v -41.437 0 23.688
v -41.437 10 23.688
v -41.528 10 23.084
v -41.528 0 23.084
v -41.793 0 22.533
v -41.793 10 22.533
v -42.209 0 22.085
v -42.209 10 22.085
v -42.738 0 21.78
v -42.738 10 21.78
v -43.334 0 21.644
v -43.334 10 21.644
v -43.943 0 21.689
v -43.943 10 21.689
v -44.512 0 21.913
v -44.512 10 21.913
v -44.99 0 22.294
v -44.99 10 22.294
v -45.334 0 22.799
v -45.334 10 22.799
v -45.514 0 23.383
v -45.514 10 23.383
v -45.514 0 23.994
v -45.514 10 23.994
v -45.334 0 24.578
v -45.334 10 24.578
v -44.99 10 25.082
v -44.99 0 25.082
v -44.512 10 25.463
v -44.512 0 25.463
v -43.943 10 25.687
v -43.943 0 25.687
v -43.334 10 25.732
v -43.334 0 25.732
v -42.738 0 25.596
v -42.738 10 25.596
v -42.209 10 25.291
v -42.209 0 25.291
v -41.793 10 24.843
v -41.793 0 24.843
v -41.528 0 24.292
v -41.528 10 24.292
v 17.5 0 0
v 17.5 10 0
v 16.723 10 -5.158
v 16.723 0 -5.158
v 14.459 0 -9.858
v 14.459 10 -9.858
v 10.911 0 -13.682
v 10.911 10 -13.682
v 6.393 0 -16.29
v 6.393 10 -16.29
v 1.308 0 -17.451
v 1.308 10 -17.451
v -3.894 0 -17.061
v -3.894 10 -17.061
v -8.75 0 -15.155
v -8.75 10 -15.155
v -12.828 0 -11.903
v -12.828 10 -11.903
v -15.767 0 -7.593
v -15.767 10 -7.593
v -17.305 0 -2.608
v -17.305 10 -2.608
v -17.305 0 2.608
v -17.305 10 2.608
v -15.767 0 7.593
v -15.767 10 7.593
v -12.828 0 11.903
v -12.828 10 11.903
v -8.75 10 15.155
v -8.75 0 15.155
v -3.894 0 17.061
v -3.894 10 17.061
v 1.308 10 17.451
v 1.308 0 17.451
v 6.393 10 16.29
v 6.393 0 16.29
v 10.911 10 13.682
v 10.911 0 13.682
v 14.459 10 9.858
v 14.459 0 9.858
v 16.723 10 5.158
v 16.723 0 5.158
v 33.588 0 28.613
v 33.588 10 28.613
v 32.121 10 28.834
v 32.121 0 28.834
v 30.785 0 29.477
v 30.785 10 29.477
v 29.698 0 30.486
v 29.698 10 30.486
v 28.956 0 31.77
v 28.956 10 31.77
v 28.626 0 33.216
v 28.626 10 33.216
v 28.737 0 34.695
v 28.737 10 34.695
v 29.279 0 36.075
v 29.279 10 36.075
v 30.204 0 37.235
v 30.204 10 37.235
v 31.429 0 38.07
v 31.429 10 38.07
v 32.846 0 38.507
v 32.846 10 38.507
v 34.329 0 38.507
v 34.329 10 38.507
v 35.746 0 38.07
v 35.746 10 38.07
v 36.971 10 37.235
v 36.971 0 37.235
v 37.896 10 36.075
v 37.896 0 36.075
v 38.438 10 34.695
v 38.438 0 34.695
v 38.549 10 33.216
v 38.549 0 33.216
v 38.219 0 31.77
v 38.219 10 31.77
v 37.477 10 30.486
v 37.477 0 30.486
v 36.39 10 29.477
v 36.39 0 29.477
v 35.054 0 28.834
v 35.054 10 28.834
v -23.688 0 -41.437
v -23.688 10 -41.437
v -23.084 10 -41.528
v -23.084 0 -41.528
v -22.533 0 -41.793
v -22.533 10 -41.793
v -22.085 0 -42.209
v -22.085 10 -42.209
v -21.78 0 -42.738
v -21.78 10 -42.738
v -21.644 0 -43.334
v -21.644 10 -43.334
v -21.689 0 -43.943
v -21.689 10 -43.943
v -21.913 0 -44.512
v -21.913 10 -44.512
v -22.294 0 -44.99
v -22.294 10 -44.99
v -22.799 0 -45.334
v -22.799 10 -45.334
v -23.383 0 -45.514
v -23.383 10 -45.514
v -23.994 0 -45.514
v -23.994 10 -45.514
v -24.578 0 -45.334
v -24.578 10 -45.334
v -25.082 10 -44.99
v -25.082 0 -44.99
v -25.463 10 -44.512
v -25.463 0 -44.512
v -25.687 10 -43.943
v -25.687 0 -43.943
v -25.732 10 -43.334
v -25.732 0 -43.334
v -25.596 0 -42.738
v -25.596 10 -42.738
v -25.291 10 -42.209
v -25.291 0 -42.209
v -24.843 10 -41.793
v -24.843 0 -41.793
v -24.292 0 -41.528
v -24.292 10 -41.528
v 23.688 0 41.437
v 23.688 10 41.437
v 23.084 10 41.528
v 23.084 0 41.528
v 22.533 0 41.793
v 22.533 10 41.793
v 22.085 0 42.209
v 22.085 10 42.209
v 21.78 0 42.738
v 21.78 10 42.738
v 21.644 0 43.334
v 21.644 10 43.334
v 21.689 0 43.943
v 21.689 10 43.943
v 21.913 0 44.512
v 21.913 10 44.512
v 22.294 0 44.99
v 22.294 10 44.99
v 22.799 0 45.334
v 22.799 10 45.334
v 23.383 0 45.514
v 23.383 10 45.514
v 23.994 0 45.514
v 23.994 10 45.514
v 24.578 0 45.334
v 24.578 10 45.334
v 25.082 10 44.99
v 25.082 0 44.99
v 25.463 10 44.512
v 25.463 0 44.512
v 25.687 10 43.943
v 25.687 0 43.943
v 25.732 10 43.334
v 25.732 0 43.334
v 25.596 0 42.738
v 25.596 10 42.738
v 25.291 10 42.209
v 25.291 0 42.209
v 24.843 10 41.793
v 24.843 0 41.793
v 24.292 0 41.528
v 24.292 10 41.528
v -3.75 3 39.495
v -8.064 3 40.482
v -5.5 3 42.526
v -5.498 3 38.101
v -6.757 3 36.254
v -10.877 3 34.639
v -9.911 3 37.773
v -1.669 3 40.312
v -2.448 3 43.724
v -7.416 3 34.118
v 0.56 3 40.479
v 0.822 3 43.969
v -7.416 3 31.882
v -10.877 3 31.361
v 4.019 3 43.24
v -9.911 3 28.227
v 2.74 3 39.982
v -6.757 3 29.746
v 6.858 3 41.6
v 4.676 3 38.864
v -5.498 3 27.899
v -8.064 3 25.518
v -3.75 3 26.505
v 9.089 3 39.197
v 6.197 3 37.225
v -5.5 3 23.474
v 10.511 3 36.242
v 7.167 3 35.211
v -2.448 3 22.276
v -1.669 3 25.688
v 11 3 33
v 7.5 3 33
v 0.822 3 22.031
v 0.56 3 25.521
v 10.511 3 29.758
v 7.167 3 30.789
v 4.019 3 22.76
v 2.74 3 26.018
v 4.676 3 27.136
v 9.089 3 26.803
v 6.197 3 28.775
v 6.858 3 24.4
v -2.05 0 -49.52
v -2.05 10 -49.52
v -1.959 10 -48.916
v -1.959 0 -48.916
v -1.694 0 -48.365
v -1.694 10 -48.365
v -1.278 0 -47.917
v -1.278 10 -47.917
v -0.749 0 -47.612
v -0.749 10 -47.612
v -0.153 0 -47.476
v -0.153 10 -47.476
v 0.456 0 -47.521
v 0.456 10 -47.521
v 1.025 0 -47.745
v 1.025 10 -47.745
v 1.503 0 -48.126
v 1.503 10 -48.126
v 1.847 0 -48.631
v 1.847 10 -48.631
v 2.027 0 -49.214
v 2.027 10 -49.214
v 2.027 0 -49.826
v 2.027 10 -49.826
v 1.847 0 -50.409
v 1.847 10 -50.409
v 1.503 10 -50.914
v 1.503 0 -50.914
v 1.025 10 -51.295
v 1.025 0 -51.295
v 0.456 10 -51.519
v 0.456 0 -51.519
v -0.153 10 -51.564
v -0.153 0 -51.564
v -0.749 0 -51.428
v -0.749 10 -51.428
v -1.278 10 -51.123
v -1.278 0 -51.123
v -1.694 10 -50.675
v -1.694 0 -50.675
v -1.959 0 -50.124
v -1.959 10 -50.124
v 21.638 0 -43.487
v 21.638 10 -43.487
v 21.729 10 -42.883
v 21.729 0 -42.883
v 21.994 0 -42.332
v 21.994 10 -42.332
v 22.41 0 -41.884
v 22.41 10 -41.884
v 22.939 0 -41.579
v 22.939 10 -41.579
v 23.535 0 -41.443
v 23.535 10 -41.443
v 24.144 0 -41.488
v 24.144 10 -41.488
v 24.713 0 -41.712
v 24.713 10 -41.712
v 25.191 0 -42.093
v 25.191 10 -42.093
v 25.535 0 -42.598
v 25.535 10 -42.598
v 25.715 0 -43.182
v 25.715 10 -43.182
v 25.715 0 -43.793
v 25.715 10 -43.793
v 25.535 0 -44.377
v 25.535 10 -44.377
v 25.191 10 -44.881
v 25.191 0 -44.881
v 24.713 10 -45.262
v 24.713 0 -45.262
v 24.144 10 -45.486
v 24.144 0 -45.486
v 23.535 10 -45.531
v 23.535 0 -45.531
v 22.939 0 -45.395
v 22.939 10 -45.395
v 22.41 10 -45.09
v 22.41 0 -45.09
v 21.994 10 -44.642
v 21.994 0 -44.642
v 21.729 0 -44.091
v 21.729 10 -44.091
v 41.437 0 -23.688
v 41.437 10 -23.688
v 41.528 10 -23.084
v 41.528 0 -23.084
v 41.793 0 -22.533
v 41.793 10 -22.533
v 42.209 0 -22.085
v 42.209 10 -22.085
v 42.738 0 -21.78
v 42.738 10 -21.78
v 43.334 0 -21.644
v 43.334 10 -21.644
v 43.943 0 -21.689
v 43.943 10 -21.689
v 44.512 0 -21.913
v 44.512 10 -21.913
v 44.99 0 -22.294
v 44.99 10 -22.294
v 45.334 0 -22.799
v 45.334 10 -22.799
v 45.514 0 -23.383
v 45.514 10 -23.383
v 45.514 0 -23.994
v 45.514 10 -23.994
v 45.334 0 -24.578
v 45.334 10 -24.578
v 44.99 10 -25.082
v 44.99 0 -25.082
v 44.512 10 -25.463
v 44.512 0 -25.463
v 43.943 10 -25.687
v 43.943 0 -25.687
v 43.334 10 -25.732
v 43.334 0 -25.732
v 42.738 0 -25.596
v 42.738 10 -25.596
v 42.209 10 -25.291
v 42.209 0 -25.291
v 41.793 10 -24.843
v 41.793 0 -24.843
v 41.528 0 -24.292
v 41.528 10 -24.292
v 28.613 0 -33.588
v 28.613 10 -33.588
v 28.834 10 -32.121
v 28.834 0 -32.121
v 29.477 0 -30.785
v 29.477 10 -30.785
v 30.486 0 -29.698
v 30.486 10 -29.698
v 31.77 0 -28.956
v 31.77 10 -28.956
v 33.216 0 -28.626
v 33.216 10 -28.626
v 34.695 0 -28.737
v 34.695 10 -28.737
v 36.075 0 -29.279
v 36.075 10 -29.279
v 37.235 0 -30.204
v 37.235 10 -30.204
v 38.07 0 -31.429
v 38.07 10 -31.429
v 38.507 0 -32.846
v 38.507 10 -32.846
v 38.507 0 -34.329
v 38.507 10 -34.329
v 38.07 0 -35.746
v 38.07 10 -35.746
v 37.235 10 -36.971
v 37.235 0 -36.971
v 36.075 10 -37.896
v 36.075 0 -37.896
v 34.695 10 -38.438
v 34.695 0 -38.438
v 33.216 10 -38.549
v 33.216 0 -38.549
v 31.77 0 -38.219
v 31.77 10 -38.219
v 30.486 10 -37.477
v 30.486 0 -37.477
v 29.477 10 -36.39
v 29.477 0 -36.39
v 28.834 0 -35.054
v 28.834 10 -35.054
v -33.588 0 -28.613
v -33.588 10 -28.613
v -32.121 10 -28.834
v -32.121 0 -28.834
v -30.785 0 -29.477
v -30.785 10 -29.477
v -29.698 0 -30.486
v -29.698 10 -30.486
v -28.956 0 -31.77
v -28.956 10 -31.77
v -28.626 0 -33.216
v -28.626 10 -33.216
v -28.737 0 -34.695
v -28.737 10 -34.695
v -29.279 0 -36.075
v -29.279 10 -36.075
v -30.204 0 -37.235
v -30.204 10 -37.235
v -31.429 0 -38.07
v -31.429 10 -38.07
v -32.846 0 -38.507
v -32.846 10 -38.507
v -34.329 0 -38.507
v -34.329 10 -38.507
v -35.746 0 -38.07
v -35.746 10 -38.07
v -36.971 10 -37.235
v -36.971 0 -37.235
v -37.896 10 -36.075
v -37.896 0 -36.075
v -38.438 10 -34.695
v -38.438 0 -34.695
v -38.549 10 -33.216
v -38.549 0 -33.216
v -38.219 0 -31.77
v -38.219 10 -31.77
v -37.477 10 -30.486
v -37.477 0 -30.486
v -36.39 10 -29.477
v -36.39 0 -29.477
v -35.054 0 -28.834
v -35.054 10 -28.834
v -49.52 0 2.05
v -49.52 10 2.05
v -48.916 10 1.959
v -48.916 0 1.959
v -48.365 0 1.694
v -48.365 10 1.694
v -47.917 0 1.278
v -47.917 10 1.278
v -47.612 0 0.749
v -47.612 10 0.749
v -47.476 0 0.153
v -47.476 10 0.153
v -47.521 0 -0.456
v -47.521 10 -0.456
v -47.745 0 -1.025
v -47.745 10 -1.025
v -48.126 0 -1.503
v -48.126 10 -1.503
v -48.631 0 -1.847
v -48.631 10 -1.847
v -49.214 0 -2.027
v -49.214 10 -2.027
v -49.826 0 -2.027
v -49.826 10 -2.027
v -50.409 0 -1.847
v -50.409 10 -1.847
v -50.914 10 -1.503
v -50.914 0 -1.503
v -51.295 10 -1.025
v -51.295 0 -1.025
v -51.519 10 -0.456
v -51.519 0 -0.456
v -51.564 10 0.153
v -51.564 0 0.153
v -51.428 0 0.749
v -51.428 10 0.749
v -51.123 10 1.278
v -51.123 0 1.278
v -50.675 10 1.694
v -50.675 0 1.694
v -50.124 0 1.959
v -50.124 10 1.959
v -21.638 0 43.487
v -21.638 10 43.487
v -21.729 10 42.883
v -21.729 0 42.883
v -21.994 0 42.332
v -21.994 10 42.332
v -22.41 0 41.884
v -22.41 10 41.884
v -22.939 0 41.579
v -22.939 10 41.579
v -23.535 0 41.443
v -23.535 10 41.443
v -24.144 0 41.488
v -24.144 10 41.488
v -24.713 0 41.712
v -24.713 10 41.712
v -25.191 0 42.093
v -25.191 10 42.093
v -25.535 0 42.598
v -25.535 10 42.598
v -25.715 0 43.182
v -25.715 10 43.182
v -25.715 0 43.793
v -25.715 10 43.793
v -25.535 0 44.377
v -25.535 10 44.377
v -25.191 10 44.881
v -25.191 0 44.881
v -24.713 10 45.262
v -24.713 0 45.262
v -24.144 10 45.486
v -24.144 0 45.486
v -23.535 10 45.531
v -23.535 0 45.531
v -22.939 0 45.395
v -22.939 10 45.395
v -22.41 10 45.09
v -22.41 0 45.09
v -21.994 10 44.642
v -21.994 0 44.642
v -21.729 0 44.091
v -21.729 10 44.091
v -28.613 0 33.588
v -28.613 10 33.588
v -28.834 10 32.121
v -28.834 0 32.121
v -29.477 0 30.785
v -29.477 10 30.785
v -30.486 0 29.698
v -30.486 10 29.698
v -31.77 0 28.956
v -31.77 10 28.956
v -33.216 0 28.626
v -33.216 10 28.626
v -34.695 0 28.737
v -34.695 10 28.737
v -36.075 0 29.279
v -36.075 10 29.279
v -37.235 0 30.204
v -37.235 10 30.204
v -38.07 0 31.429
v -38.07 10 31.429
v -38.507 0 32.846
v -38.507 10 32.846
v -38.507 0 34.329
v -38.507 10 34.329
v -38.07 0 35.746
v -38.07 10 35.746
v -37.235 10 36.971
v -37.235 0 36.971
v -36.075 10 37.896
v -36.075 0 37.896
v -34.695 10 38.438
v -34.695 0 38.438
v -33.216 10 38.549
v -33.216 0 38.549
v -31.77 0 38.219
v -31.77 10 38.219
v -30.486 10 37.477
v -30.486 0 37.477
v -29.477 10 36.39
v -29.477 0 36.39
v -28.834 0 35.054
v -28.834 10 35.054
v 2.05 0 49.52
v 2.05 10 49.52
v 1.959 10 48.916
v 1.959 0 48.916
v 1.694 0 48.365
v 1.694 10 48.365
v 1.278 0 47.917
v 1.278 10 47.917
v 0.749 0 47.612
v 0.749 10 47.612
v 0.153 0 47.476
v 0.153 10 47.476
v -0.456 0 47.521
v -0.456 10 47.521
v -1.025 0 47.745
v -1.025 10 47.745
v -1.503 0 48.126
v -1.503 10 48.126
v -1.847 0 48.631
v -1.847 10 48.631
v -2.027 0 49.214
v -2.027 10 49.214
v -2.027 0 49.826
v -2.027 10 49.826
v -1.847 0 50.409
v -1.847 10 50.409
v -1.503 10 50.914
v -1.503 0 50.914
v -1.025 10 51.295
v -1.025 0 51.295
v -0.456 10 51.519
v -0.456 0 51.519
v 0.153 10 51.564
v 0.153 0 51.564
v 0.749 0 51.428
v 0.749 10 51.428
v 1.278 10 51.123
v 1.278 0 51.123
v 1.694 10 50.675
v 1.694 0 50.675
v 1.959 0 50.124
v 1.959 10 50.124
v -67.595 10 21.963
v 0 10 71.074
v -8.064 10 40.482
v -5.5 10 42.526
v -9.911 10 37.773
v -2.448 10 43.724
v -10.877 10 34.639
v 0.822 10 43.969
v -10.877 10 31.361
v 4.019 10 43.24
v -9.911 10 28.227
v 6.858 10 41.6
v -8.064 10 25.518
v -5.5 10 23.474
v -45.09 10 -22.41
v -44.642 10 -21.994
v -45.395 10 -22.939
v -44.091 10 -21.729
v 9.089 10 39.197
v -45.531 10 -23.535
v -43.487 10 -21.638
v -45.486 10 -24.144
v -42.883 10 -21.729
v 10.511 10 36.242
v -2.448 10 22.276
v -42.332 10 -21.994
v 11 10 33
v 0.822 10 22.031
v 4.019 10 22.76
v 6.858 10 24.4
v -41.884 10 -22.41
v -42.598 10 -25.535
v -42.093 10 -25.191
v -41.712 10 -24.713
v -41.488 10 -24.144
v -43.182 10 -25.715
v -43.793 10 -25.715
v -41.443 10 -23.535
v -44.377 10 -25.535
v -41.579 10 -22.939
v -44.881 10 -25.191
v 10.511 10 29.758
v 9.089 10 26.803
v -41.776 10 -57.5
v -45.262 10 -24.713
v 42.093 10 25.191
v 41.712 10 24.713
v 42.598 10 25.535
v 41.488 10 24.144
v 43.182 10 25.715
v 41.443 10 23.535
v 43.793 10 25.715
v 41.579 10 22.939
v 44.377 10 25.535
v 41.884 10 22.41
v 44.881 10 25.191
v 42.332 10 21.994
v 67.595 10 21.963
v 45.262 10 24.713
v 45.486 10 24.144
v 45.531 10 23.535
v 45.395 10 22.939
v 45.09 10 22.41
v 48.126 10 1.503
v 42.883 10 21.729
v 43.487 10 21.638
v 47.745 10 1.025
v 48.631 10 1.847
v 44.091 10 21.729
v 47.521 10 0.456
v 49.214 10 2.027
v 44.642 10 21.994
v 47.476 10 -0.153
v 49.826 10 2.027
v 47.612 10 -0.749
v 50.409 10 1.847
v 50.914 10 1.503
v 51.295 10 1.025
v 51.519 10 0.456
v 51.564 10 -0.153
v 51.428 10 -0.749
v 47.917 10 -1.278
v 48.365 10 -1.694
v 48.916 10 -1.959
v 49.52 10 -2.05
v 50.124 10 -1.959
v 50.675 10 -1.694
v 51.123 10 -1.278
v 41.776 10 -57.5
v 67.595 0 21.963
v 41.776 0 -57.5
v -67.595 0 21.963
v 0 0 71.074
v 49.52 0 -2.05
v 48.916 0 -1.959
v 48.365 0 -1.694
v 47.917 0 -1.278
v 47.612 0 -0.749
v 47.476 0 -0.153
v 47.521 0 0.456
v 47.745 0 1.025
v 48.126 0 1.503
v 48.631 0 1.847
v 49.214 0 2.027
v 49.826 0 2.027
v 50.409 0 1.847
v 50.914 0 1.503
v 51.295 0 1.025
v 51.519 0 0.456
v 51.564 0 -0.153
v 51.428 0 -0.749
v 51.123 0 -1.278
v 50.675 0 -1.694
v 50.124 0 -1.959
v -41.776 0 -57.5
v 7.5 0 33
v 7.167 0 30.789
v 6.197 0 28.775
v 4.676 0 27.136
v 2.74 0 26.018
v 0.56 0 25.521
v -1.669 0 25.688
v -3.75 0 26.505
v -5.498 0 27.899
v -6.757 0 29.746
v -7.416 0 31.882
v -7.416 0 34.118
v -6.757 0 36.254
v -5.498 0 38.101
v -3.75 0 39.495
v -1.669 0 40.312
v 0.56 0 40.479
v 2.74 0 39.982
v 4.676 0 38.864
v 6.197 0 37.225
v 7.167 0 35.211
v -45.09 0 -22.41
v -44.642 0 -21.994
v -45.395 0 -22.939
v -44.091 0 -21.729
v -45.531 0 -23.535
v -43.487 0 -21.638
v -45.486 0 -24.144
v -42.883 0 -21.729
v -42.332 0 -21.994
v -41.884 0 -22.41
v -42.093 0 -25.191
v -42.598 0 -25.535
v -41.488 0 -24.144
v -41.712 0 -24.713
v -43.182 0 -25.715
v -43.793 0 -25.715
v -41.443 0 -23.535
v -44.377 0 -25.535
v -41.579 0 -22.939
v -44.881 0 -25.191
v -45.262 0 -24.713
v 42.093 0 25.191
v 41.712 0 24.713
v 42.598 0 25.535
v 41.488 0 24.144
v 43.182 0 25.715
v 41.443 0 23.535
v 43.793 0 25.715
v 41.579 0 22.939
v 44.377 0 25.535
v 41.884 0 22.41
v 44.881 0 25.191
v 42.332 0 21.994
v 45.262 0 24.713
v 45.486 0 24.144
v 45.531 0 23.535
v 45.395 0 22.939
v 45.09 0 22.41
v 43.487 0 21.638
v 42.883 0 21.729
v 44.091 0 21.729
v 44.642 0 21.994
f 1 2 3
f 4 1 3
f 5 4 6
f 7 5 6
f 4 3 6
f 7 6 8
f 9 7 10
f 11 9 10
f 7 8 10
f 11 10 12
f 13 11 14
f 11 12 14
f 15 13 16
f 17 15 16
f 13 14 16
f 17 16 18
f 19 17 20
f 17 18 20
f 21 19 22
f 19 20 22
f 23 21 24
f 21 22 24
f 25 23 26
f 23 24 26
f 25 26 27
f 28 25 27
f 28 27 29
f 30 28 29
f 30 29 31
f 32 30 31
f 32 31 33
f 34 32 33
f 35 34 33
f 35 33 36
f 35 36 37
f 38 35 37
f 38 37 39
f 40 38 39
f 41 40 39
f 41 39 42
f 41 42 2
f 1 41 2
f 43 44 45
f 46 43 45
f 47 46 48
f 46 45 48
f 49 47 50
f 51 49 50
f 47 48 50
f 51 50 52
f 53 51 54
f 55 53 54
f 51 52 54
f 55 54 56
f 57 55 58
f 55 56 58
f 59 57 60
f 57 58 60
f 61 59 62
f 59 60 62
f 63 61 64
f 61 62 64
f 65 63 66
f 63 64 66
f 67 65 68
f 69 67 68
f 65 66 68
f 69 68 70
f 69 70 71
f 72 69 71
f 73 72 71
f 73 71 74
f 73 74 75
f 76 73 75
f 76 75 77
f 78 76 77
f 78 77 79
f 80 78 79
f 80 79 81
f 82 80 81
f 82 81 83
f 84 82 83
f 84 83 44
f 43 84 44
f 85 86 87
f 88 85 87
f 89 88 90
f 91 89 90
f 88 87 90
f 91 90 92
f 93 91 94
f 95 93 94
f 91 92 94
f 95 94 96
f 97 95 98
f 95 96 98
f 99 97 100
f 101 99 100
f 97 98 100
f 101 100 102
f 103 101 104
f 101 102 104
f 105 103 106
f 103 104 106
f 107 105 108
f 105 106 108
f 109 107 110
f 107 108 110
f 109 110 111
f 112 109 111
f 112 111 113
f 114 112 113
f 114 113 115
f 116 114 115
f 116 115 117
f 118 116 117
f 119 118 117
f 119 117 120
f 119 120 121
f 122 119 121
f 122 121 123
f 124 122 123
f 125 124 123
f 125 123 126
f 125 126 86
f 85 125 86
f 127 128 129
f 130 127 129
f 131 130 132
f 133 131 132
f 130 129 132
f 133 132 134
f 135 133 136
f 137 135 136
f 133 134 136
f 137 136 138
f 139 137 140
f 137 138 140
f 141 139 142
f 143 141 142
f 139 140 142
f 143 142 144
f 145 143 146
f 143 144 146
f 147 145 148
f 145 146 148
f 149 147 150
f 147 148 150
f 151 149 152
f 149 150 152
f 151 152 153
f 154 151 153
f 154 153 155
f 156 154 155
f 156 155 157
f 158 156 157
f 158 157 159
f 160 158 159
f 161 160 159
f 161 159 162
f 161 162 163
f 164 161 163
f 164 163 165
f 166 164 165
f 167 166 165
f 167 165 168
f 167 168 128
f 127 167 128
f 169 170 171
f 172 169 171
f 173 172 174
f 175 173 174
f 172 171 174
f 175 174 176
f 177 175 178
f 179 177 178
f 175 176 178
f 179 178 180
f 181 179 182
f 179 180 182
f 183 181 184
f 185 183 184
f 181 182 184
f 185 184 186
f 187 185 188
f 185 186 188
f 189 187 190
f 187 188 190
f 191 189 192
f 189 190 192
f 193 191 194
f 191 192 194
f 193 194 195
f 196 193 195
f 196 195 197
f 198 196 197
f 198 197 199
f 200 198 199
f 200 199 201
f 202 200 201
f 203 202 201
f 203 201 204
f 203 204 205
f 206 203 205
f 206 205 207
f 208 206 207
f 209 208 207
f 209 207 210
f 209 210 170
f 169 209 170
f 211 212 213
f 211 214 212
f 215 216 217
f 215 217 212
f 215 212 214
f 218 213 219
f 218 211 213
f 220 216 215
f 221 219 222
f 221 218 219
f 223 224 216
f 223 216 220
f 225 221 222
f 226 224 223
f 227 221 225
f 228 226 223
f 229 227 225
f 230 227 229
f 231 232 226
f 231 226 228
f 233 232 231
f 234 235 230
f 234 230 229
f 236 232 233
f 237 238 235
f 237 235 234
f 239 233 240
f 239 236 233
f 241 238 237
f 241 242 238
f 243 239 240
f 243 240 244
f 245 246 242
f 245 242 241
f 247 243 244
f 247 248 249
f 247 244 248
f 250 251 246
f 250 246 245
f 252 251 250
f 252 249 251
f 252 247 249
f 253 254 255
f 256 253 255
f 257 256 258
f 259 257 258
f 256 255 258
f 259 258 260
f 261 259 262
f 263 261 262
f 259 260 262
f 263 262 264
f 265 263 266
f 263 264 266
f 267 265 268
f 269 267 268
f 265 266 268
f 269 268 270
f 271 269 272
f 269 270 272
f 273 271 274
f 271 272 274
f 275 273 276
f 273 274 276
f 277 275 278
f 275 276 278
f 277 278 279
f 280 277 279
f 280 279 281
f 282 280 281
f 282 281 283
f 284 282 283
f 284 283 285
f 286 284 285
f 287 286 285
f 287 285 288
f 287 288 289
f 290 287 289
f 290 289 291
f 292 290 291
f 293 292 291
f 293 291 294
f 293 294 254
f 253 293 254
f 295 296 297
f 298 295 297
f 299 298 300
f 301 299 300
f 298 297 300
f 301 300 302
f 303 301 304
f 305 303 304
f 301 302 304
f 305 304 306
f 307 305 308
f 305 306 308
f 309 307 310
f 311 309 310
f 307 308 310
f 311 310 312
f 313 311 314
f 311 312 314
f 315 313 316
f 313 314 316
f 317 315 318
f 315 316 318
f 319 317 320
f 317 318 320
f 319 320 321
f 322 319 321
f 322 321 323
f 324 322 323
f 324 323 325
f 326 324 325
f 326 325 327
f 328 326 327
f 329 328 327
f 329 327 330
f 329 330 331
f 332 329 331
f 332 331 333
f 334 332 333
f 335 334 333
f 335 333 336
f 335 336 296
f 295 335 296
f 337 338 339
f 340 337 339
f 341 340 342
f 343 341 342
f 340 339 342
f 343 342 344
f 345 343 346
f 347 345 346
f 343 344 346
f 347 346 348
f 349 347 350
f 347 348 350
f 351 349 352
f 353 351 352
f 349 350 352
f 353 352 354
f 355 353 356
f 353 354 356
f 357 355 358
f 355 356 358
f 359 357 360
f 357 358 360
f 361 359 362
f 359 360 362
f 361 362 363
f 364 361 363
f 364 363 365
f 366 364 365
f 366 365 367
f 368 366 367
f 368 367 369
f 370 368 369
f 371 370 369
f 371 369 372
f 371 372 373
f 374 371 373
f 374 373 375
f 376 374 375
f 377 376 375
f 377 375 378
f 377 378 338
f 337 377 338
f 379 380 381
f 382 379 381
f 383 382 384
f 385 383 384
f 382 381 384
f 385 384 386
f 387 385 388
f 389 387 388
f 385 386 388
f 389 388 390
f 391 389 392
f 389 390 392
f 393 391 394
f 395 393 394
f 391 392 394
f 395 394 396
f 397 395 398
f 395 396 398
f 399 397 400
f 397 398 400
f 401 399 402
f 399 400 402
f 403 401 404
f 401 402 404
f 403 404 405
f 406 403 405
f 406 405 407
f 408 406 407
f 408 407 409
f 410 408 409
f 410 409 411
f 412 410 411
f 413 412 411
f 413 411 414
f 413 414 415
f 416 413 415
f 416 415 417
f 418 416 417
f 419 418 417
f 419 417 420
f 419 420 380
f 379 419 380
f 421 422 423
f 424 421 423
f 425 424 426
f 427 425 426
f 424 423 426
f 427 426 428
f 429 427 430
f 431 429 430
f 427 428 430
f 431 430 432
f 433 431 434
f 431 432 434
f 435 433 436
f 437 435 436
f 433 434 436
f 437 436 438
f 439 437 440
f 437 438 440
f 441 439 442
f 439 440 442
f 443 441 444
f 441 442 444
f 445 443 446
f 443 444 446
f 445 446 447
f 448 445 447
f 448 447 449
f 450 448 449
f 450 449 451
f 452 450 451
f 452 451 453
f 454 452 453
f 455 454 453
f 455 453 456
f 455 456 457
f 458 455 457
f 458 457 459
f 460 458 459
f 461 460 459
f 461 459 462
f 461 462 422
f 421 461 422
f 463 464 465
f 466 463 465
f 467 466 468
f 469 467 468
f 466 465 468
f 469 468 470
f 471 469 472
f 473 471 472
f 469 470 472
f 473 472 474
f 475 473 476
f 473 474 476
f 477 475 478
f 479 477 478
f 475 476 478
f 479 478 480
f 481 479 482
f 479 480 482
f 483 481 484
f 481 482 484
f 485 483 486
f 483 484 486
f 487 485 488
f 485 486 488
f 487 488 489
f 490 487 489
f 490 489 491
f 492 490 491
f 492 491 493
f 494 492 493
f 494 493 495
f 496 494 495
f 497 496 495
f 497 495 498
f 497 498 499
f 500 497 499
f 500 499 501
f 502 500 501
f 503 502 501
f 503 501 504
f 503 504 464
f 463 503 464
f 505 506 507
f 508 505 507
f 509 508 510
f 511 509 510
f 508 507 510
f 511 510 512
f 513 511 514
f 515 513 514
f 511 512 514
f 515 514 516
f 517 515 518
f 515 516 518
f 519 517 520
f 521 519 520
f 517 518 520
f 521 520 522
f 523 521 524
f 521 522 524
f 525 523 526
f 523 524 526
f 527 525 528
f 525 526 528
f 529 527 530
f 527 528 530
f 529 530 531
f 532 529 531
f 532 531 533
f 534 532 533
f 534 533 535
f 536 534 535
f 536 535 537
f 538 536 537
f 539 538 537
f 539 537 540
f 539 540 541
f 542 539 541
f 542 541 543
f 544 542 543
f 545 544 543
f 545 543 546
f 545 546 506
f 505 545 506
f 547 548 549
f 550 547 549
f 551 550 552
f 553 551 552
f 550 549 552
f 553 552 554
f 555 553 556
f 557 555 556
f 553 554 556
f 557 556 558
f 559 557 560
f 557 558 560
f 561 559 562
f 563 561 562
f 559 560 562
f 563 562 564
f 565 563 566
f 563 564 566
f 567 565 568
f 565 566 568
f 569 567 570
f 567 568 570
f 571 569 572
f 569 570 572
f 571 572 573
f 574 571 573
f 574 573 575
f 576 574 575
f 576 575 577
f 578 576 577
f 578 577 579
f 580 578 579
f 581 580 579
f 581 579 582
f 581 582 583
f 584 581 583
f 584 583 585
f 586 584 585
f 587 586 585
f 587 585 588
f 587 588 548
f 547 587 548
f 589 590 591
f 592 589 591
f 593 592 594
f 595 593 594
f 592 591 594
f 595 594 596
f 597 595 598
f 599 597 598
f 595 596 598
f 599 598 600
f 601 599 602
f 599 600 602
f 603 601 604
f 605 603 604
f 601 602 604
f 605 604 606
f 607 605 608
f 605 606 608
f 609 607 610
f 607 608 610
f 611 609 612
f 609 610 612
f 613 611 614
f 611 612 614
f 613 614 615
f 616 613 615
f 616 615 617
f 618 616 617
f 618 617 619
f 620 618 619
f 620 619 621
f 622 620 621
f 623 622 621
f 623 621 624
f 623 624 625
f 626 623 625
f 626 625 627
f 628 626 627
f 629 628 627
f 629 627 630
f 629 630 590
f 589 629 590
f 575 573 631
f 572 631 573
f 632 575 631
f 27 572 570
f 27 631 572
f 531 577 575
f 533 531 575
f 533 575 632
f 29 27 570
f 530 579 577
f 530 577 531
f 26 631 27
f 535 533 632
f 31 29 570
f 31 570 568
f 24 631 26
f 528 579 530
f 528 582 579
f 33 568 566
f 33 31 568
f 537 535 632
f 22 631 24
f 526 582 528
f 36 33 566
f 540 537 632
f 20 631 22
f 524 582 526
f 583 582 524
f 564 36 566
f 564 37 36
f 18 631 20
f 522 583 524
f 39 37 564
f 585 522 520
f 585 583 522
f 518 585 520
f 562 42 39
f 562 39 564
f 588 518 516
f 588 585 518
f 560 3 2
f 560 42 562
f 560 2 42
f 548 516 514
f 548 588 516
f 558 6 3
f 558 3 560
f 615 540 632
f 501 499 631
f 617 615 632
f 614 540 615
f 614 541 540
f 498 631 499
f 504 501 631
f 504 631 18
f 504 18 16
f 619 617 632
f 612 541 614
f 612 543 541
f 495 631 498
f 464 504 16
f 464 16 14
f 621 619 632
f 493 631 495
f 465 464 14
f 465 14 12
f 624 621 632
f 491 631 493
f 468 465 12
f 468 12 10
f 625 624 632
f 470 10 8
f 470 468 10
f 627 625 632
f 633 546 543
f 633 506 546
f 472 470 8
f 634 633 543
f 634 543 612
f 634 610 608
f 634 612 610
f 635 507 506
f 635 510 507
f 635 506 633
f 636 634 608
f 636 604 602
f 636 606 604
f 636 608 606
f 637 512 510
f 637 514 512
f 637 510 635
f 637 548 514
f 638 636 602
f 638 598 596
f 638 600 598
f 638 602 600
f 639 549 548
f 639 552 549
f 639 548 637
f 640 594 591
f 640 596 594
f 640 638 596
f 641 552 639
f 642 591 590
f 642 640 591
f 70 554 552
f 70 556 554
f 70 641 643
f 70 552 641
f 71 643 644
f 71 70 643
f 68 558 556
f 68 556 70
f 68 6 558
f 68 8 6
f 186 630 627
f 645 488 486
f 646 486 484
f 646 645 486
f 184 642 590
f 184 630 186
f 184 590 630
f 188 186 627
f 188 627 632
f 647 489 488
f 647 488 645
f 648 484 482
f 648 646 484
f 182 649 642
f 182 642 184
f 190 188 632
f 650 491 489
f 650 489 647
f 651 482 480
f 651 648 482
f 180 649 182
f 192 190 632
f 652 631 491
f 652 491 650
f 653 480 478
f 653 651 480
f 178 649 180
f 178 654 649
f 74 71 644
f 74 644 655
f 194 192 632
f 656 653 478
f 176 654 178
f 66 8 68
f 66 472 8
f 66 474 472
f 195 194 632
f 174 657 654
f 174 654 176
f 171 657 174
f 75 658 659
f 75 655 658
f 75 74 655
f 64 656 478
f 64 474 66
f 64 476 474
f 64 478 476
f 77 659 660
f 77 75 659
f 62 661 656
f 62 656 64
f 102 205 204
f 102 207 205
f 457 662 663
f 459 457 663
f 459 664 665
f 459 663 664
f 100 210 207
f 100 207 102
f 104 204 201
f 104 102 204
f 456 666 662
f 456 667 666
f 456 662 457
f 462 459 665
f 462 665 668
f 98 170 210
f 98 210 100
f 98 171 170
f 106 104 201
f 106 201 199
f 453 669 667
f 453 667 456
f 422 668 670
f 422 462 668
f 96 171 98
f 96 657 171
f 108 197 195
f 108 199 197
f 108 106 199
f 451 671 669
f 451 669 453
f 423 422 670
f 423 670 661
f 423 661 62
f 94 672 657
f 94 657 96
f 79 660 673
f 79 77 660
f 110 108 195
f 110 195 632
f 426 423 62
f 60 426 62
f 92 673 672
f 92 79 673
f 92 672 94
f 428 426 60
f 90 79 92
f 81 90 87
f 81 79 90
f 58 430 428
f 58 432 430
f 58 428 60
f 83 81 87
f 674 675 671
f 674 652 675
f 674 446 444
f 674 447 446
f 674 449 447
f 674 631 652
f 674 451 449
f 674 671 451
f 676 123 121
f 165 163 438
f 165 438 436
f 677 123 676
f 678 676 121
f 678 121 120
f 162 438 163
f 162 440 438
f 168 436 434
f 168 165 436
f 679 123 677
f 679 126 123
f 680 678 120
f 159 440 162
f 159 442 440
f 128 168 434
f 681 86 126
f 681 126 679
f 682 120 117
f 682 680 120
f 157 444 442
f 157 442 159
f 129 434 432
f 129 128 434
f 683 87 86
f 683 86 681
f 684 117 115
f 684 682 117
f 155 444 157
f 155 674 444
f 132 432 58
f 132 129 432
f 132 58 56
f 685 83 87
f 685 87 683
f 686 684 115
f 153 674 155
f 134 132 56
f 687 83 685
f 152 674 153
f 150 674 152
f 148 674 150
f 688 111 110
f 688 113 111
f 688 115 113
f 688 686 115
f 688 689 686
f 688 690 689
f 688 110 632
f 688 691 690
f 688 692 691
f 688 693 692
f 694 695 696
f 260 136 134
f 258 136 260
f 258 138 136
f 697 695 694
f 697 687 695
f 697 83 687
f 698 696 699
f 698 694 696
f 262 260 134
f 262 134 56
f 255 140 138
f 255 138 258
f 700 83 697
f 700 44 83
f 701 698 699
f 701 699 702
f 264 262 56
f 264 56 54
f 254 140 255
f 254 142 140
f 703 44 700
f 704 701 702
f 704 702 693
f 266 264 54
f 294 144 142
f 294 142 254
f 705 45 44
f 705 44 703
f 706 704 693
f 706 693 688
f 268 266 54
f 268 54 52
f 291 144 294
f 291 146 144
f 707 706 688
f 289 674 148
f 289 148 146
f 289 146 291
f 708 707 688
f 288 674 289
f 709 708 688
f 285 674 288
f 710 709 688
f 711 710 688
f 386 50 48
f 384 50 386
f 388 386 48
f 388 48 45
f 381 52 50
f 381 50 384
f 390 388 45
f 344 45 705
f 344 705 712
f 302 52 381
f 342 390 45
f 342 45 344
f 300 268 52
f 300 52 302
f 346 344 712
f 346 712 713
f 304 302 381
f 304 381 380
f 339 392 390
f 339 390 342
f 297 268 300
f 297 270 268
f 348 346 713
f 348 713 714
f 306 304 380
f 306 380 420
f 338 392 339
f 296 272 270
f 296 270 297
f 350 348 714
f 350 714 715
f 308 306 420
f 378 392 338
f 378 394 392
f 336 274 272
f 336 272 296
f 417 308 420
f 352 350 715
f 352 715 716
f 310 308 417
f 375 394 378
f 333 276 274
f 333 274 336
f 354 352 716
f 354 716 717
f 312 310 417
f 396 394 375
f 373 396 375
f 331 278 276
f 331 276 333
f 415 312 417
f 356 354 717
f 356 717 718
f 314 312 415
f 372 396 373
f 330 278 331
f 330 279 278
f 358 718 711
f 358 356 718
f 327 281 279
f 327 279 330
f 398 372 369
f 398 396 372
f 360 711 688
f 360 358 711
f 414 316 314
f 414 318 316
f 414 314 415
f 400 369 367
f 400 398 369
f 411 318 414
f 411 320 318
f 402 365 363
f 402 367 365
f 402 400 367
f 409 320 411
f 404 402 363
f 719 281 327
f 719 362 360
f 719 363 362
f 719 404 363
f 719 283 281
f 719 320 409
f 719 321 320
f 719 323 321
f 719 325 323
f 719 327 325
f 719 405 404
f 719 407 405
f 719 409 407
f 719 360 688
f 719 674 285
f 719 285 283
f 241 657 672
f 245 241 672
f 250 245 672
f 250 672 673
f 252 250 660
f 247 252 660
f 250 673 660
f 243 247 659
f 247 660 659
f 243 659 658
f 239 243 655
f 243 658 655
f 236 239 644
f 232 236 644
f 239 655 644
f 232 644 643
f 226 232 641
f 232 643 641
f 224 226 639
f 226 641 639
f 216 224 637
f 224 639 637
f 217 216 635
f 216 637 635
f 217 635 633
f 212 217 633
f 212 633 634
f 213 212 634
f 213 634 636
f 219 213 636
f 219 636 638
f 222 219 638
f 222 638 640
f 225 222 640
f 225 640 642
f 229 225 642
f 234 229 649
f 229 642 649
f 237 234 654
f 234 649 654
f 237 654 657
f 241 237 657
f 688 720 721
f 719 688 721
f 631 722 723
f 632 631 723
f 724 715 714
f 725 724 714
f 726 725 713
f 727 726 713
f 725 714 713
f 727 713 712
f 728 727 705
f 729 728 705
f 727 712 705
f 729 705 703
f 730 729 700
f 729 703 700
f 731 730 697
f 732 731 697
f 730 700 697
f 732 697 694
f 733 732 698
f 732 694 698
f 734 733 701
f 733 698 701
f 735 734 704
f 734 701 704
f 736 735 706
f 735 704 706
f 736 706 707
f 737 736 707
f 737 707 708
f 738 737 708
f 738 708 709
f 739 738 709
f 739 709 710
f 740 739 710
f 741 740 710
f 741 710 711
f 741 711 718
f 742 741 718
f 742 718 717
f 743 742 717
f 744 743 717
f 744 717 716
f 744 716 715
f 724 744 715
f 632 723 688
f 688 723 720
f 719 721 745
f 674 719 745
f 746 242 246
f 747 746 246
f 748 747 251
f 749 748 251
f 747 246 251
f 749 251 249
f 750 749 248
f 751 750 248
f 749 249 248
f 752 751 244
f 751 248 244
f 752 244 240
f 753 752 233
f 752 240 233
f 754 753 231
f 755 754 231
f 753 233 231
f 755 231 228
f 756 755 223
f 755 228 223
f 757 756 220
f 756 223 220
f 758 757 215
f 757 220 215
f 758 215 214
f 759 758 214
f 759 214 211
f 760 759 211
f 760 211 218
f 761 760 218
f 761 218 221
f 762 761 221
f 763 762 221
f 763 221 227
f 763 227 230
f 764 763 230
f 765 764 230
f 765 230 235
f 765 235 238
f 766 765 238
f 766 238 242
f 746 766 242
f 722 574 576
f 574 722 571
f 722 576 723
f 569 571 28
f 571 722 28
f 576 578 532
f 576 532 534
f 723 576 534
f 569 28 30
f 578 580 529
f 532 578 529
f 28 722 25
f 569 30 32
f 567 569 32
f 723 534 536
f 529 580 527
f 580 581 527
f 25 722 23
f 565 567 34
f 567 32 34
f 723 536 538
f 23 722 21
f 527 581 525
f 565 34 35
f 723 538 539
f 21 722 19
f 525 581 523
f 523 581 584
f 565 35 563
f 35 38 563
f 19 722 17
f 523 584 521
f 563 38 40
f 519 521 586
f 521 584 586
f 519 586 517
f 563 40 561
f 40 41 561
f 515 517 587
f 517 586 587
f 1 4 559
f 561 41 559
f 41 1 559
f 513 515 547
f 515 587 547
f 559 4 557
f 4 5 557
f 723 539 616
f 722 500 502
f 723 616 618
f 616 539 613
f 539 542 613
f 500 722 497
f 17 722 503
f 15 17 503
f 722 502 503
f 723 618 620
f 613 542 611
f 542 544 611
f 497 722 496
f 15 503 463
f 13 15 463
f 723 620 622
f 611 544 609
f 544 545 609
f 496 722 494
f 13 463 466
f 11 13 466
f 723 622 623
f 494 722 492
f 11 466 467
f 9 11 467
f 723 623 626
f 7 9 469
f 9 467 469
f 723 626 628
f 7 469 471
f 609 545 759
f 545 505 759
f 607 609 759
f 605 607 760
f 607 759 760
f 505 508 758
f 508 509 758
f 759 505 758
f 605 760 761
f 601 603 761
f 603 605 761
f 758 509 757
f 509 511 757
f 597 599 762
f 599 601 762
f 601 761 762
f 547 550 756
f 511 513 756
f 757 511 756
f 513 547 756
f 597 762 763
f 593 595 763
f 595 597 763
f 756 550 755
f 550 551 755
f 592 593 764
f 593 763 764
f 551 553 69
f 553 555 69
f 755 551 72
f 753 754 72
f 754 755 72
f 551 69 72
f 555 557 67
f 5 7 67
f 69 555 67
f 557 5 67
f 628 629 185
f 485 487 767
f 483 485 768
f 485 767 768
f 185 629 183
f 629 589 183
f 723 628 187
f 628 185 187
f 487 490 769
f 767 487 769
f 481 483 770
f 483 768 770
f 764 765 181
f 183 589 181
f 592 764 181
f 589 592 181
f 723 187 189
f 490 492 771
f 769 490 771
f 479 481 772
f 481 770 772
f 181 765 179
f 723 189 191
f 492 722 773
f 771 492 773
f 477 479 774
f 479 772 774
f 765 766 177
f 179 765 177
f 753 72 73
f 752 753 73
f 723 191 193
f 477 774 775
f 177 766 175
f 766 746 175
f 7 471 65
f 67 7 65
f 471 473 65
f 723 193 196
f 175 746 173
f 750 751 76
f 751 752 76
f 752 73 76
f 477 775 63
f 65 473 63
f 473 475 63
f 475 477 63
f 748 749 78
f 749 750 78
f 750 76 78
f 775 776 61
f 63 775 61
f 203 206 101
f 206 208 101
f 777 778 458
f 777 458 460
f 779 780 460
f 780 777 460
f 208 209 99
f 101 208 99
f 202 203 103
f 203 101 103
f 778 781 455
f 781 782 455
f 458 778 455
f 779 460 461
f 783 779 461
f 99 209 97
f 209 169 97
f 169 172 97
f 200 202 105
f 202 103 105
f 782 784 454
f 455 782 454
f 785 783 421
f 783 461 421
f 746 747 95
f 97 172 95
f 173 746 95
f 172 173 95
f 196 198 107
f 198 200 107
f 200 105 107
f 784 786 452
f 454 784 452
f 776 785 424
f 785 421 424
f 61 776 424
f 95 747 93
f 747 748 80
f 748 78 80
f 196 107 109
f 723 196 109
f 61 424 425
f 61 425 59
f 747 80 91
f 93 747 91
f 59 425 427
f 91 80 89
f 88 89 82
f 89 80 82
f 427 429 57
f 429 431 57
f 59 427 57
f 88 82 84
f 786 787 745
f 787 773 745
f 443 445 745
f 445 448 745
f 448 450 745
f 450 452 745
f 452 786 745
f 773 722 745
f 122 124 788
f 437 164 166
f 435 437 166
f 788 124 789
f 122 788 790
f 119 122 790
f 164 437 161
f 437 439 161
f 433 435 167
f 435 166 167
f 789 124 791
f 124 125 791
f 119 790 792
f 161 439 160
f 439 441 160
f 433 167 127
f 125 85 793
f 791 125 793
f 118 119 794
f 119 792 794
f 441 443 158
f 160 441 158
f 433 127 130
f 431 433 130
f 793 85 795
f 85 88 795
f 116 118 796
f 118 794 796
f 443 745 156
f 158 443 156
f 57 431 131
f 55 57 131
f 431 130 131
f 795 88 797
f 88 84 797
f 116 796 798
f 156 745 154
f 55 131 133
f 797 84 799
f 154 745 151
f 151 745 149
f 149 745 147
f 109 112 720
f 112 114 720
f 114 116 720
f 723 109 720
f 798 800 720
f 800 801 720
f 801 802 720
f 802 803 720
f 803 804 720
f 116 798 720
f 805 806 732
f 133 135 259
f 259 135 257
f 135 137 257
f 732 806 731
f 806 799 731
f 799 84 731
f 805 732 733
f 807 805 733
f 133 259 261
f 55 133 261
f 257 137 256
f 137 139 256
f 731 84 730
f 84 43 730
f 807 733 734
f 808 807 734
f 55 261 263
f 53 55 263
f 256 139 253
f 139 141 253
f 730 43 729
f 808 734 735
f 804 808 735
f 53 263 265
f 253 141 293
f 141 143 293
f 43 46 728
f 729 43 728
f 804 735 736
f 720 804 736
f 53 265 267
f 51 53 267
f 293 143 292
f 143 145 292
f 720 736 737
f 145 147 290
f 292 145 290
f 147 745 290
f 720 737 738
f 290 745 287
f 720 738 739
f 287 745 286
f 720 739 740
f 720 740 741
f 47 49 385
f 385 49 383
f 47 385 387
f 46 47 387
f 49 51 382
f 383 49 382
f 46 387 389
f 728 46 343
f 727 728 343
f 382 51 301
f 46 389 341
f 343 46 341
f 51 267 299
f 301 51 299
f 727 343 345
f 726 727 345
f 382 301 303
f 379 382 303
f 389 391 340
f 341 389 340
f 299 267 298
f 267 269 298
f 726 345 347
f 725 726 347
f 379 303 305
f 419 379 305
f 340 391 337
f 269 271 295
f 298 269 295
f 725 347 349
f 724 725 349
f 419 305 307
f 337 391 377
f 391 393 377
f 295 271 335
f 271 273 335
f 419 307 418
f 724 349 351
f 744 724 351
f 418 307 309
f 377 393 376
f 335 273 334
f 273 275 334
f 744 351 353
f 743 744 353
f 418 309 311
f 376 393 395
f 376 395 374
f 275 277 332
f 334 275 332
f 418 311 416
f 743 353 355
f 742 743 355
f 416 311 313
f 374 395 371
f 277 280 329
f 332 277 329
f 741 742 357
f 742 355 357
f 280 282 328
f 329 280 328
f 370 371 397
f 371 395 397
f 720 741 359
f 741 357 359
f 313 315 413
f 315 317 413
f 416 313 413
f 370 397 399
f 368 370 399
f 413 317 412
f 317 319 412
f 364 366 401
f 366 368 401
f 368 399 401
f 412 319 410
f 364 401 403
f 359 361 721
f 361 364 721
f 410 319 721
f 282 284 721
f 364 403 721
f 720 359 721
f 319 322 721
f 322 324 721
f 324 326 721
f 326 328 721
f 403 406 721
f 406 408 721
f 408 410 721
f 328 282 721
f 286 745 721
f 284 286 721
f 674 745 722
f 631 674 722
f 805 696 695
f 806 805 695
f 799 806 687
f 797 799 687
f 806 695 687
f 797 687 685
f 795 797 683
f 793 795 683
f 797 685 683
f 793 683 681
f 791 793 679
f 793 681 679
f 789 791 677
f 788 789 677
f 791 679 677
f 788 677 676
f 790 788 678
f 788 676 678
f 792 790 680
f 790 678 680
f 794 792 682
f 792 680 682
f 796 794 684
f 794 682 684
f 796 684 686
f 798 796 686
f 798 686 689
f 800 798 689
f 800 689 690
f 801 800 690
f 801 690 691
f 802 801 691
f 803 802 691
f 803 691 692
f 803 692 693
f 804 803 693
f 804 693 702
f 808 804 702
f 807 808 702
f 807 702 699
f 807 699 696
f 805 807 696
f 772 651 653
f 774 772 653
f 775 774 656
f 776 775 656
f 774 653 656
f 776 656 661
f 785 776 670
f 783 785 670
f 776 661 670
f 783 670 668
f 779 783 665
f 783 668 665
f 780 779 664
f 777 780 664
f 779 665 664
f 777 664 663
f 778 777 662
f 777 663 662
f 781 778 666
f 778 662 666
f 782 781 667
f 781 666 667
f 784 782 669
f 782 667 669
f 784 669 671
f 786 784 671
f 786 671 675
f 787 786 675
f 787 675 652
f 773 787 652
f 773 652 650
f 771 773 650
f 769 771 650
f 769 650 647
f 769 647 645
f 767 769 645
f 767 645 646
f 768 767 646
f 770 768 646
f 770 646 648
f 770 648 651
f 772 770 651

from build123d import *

# Parameters (mm, degrees)
BOSS_EXTRUDE1_DEPTH = 10
SKETCH2_R           = 11
CUT_EXTRUDE1_DEPTH  = 7
SKETCH3_R           = 7.5
CUT_EXTRUDE2_DEPTH  = 4
SKETCH5_R           = 4.975
SKETCH5_R_2         = 2.05
CUT_EXTRUDE4_DEPTH  = 11
SKETCH6_R           = 2.05
CUT_EXTRUDE5_DEPTH  = 11
CIRPATTERN1_COUNT   = 4
SKETCH7_R           = 17.5
CUT_EXTRUDE6_DEPTH  = 11


with BuildPart() as part:
    # Sketch1 → Boss-Extrude1 (new body)
    with BuildSketch(Plane(origin=(0, 0, 0), x_dir=(1, 0, 0), z_dir=(0, 1, 0))):
        Polygon((0, -71.073908706), (67.595304014, -21.963045647), (41.77619536, 57.5), (-41.77619536, 57.5), (-67.595304014, -21.963045647), align=None)
    extrude(amount=BOSS_EXTRUDE1_DEPTH)

    # Sketch2 → Cut-Extrude1 (cut)
    with BuildSketch(Plane(origin=(0, 10, 0), x_dir=(1, 0, 0), z_dir=(0, 1, 0))):
        with Locations((0, -33)):
            Circle(SKETCH2_R)
    extrude(amount=-CUT_EXTRUDE1_DEPTH, mode=Mode.SUBTRACT)

    # Sketch3 → Cut-Extrude2 (cut, through all)
    with BuildSketch(Plane(origin=(0, 3, 0), x_dir=(1, 0, 0), z_dir=(0, 1, 0))):
        with Locations((0, -33)):
            Circle(SKETCH3_R)
    extrude(amount=-CUT_EXTRUDE2_DEPTH, mode=Mode.SUBTRACT)

    # Sketch5 → Cut-Extrude4 (cut, through all)
    with BuildSketch(Plane(origin=(0, 10, 0), x_dir=(1, 0, 0), z_dir=(0, 1, 0))):
        with Locations((-33.587572106, -33.587572106)):
            Circle(SKETCH5_R)
        with Locations((-43.487067043, -23.68807717)):
            Circle(SKETCH5_R_2)
        with Locations((-23.68807717, -43.487067043)):
            Circle(SKETCH5_R_2)
    cut_extrude4 = extrude(amount=-CUT_EXTRUDE4_DEPTH, mode=Mode.SUBTRACT)

    # Sketch6 → Cut-Extrude5 (cut, through all)
    with BuildSketch(Plane(origin=(0, 10, 0), x_dir=(1, 0, 0), z_dir=(0, 1, 0))):
        with Locations((0, -49.52)):
            Circle(SKETCH6_R)
    cut_extrude5 = extrude(amount=-CUT_EXTRUDE5_DEPTH, mode=Mode.SUBTRACT)

    # CirPattern1: Cut-Extrude4, Cut-Extrude5 ×4 about axis
    cirpattern1_axis = Axis((0, 0, 0), (0, 1, 0))
    for i in range(1, CIRPATTERN1_COUNT):
        add(cut_extrude4.rotate(cirpattern1_axis, i * 360 / CIRPATTERN1_COUNT), mode=Mode.SUBTRACT)
        add(cut_extrude5.rotate(cirpattern1_axis, i * 360 / CIRPATTERN1_COUNT), mode=Mode.SUBTRACT)

    # Sketch7 → Cut-Extrude6 (cut, through all)
    with BuildSketch(Plane(origin=(0, 10, 0), x_dir=(1, 0, 0), z_dir=(0, 1, 0))):
        Circle(SKETCH7_R)
    extrude(amount=-CUT_EXTRUDE6_DEPTH, mode=Mode.SUBTRACT)


solid = part.part
